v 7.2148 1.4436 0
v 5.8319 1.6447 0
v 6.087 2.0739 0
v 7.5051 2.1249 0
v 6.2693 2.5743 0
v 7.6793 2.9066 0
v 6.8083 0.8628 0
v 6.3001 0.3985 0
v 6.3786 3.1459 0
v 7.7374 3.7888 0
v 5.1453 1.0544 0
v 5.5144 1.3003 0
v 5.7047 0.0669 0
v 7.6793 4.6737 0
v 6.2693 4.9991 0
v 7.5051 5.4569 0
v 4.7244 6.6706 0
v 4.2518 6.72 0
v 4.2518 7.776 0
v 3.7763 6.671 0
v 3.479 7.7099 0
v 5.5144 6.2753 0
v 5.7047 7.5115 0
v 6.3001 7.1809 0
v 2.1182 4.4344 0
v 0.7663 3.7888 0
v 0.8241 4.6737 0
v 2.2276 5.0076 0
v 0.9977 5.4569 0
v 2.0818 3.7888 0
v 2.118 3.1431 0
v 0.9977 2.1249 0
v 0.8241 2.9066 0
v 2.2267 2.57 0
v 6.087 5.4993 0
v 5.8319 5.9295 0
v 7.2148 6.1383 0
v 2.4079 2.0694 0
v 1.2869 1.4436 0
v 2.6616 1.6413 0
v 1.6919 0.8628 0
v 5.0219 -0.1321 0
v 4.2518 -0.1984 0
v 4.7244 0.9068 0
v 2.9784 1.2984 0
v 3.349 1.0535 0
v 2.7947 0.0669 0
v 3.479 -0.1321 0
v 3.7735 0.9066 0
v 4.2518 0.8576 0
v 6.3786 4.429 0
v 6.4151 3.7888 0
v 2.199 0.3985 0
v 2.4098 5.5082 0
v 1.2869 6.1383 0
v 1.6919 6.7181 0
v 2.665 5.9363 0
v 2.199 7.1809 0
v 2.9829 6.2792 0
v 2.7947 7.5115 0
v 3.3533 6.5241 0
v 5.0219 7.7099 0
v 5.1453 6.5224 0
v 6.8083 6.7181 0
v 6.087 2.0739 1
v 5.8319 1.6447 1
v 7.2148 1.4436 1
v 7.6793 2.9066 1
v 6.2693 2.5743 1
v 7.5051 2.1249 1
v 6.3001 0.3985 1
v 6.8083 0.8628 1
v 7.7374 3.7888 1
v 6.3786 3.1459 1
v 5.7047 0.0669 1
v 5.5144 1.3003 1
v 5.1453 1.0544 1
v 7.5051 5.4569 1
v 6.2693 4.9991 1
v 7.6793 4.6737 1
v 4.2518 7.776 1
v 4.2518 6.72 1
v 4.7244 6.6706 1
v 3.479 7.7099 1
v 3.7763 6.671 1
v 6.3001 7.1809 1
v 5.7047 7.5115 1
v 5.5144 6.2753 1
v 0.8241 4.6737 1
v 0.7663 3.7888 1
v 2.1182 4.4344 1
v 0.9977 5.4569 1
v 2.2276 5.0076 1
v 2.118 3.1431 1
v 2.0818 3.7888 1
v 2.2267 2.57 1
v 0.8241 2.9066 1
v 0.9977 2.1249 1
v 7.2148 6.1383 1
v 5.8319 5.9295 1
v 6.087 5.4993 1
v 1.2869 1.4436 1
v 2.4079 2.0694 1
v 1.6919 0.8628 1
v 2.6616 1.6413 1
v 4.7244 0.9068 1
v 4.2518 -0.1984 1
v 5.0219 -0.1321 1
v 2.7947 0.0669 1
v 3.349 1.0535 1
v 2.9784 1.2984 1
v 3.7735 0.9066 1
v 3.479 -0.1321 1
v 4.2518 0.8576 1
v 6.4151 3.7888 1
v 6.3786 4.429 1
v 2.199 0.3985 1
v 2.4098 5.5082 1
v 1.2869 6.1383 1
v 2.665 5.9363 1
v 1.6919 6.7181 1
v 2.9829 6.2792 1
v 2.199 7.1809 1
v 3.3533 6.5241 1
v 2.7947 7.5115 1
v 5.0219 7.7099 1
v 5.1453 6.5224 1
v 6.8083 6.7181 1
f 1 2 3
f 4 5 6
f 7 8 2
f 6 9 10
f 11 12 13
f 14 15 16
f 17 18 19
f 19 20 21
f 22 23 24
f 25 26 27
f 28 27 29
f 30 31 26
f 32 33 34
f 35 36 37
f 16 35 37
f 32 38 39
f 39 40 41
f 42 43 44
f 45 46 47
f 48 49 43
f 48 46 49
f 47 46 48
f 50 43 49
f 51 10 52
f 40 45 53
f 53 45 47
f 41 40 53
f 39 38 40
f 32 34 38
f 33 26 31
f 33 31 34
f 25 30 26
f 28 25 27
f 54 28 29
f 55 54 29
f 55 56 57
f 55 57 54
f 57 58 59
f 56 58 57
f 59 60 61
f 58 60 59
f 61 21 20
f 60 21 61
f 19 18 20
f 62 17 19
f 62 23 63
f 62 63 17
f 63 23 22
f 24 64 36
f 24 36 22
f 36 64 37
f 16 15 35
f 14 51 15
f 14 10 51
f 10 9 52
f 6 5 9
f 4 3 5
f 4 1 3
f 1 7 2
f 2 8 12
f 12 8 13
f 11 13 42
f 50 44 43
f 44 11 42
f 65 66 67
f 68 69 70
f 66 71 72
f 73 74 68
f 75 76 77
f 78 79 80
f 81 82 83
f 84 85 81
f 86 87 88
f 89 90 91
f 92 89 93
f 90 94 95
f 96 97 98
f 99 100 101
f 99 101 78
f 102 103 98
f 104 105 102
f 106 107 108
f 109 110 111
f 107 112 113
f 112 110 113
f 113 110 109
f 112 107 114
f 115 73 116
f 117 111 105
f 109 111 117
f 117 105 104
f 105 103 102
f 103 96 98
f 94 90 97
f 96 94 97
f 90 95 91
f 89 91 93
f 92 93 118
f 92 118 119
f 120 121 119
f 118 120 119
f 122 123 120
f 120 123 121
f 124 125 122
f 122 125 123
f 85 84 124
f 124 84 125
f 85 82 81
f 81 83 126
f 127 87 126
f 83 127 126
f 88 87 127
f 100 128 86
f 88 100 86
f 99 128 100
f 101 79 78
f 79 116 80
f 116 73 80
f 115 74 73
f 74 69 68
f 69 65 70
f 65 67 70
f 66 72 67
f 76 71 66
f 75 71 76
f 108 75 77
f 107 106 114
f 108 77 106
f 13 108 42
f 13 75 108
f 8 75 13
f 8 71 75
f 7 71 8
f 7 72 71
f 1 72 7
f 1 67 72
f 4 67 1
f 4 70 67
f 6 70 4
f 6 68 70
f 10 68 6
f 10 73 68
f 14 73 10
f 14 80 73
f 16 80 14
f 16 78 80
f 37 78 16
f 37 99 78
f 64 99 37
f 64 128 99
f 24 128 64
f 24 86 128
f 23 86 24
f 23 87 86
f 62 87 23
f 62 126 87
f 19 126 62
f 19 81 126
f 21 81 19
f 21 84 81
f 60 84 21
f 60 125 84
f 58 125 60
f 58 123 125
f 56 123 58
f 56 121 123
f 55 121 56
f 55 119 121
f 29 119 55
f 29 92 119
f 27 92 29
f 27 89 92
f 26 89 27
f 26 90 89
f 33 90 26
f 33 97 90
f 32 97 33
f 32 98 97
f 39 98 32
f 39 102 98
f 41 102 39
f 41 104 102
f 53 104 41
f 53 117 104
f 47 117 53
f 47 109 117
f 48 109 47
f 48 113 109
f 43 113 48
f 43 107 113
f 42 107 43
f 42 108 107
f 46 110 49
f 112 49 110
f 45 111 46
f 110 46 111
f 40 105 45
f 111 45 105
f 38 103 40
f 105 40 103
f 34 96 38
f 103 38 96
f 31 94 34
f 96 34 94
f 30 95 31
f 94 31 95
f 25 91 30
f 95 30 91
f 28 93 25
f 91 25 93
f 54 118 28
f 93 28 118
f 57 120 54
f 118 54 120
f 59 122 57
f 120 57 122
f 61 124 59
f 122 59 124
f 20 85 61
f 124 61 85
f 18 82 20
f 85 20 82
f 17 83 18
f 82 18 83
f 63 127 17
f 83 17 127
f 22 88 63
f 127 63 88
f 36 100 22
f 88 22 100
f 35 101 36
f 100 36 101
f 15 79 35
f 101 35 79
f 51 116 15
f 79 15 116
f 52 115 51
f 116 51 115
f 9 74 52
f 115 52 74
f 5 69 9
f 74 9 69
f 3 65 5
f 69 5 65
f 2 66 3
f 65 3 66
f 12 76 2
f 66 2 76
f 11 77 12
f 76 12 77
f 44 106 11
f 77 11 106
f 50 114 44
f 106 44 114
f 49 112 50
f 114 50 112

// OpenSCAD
linear_extrude(height=1,slices=1) {
    text("\u1D0F", size=10, font="DejaVu Sans:style=Medium");
}
